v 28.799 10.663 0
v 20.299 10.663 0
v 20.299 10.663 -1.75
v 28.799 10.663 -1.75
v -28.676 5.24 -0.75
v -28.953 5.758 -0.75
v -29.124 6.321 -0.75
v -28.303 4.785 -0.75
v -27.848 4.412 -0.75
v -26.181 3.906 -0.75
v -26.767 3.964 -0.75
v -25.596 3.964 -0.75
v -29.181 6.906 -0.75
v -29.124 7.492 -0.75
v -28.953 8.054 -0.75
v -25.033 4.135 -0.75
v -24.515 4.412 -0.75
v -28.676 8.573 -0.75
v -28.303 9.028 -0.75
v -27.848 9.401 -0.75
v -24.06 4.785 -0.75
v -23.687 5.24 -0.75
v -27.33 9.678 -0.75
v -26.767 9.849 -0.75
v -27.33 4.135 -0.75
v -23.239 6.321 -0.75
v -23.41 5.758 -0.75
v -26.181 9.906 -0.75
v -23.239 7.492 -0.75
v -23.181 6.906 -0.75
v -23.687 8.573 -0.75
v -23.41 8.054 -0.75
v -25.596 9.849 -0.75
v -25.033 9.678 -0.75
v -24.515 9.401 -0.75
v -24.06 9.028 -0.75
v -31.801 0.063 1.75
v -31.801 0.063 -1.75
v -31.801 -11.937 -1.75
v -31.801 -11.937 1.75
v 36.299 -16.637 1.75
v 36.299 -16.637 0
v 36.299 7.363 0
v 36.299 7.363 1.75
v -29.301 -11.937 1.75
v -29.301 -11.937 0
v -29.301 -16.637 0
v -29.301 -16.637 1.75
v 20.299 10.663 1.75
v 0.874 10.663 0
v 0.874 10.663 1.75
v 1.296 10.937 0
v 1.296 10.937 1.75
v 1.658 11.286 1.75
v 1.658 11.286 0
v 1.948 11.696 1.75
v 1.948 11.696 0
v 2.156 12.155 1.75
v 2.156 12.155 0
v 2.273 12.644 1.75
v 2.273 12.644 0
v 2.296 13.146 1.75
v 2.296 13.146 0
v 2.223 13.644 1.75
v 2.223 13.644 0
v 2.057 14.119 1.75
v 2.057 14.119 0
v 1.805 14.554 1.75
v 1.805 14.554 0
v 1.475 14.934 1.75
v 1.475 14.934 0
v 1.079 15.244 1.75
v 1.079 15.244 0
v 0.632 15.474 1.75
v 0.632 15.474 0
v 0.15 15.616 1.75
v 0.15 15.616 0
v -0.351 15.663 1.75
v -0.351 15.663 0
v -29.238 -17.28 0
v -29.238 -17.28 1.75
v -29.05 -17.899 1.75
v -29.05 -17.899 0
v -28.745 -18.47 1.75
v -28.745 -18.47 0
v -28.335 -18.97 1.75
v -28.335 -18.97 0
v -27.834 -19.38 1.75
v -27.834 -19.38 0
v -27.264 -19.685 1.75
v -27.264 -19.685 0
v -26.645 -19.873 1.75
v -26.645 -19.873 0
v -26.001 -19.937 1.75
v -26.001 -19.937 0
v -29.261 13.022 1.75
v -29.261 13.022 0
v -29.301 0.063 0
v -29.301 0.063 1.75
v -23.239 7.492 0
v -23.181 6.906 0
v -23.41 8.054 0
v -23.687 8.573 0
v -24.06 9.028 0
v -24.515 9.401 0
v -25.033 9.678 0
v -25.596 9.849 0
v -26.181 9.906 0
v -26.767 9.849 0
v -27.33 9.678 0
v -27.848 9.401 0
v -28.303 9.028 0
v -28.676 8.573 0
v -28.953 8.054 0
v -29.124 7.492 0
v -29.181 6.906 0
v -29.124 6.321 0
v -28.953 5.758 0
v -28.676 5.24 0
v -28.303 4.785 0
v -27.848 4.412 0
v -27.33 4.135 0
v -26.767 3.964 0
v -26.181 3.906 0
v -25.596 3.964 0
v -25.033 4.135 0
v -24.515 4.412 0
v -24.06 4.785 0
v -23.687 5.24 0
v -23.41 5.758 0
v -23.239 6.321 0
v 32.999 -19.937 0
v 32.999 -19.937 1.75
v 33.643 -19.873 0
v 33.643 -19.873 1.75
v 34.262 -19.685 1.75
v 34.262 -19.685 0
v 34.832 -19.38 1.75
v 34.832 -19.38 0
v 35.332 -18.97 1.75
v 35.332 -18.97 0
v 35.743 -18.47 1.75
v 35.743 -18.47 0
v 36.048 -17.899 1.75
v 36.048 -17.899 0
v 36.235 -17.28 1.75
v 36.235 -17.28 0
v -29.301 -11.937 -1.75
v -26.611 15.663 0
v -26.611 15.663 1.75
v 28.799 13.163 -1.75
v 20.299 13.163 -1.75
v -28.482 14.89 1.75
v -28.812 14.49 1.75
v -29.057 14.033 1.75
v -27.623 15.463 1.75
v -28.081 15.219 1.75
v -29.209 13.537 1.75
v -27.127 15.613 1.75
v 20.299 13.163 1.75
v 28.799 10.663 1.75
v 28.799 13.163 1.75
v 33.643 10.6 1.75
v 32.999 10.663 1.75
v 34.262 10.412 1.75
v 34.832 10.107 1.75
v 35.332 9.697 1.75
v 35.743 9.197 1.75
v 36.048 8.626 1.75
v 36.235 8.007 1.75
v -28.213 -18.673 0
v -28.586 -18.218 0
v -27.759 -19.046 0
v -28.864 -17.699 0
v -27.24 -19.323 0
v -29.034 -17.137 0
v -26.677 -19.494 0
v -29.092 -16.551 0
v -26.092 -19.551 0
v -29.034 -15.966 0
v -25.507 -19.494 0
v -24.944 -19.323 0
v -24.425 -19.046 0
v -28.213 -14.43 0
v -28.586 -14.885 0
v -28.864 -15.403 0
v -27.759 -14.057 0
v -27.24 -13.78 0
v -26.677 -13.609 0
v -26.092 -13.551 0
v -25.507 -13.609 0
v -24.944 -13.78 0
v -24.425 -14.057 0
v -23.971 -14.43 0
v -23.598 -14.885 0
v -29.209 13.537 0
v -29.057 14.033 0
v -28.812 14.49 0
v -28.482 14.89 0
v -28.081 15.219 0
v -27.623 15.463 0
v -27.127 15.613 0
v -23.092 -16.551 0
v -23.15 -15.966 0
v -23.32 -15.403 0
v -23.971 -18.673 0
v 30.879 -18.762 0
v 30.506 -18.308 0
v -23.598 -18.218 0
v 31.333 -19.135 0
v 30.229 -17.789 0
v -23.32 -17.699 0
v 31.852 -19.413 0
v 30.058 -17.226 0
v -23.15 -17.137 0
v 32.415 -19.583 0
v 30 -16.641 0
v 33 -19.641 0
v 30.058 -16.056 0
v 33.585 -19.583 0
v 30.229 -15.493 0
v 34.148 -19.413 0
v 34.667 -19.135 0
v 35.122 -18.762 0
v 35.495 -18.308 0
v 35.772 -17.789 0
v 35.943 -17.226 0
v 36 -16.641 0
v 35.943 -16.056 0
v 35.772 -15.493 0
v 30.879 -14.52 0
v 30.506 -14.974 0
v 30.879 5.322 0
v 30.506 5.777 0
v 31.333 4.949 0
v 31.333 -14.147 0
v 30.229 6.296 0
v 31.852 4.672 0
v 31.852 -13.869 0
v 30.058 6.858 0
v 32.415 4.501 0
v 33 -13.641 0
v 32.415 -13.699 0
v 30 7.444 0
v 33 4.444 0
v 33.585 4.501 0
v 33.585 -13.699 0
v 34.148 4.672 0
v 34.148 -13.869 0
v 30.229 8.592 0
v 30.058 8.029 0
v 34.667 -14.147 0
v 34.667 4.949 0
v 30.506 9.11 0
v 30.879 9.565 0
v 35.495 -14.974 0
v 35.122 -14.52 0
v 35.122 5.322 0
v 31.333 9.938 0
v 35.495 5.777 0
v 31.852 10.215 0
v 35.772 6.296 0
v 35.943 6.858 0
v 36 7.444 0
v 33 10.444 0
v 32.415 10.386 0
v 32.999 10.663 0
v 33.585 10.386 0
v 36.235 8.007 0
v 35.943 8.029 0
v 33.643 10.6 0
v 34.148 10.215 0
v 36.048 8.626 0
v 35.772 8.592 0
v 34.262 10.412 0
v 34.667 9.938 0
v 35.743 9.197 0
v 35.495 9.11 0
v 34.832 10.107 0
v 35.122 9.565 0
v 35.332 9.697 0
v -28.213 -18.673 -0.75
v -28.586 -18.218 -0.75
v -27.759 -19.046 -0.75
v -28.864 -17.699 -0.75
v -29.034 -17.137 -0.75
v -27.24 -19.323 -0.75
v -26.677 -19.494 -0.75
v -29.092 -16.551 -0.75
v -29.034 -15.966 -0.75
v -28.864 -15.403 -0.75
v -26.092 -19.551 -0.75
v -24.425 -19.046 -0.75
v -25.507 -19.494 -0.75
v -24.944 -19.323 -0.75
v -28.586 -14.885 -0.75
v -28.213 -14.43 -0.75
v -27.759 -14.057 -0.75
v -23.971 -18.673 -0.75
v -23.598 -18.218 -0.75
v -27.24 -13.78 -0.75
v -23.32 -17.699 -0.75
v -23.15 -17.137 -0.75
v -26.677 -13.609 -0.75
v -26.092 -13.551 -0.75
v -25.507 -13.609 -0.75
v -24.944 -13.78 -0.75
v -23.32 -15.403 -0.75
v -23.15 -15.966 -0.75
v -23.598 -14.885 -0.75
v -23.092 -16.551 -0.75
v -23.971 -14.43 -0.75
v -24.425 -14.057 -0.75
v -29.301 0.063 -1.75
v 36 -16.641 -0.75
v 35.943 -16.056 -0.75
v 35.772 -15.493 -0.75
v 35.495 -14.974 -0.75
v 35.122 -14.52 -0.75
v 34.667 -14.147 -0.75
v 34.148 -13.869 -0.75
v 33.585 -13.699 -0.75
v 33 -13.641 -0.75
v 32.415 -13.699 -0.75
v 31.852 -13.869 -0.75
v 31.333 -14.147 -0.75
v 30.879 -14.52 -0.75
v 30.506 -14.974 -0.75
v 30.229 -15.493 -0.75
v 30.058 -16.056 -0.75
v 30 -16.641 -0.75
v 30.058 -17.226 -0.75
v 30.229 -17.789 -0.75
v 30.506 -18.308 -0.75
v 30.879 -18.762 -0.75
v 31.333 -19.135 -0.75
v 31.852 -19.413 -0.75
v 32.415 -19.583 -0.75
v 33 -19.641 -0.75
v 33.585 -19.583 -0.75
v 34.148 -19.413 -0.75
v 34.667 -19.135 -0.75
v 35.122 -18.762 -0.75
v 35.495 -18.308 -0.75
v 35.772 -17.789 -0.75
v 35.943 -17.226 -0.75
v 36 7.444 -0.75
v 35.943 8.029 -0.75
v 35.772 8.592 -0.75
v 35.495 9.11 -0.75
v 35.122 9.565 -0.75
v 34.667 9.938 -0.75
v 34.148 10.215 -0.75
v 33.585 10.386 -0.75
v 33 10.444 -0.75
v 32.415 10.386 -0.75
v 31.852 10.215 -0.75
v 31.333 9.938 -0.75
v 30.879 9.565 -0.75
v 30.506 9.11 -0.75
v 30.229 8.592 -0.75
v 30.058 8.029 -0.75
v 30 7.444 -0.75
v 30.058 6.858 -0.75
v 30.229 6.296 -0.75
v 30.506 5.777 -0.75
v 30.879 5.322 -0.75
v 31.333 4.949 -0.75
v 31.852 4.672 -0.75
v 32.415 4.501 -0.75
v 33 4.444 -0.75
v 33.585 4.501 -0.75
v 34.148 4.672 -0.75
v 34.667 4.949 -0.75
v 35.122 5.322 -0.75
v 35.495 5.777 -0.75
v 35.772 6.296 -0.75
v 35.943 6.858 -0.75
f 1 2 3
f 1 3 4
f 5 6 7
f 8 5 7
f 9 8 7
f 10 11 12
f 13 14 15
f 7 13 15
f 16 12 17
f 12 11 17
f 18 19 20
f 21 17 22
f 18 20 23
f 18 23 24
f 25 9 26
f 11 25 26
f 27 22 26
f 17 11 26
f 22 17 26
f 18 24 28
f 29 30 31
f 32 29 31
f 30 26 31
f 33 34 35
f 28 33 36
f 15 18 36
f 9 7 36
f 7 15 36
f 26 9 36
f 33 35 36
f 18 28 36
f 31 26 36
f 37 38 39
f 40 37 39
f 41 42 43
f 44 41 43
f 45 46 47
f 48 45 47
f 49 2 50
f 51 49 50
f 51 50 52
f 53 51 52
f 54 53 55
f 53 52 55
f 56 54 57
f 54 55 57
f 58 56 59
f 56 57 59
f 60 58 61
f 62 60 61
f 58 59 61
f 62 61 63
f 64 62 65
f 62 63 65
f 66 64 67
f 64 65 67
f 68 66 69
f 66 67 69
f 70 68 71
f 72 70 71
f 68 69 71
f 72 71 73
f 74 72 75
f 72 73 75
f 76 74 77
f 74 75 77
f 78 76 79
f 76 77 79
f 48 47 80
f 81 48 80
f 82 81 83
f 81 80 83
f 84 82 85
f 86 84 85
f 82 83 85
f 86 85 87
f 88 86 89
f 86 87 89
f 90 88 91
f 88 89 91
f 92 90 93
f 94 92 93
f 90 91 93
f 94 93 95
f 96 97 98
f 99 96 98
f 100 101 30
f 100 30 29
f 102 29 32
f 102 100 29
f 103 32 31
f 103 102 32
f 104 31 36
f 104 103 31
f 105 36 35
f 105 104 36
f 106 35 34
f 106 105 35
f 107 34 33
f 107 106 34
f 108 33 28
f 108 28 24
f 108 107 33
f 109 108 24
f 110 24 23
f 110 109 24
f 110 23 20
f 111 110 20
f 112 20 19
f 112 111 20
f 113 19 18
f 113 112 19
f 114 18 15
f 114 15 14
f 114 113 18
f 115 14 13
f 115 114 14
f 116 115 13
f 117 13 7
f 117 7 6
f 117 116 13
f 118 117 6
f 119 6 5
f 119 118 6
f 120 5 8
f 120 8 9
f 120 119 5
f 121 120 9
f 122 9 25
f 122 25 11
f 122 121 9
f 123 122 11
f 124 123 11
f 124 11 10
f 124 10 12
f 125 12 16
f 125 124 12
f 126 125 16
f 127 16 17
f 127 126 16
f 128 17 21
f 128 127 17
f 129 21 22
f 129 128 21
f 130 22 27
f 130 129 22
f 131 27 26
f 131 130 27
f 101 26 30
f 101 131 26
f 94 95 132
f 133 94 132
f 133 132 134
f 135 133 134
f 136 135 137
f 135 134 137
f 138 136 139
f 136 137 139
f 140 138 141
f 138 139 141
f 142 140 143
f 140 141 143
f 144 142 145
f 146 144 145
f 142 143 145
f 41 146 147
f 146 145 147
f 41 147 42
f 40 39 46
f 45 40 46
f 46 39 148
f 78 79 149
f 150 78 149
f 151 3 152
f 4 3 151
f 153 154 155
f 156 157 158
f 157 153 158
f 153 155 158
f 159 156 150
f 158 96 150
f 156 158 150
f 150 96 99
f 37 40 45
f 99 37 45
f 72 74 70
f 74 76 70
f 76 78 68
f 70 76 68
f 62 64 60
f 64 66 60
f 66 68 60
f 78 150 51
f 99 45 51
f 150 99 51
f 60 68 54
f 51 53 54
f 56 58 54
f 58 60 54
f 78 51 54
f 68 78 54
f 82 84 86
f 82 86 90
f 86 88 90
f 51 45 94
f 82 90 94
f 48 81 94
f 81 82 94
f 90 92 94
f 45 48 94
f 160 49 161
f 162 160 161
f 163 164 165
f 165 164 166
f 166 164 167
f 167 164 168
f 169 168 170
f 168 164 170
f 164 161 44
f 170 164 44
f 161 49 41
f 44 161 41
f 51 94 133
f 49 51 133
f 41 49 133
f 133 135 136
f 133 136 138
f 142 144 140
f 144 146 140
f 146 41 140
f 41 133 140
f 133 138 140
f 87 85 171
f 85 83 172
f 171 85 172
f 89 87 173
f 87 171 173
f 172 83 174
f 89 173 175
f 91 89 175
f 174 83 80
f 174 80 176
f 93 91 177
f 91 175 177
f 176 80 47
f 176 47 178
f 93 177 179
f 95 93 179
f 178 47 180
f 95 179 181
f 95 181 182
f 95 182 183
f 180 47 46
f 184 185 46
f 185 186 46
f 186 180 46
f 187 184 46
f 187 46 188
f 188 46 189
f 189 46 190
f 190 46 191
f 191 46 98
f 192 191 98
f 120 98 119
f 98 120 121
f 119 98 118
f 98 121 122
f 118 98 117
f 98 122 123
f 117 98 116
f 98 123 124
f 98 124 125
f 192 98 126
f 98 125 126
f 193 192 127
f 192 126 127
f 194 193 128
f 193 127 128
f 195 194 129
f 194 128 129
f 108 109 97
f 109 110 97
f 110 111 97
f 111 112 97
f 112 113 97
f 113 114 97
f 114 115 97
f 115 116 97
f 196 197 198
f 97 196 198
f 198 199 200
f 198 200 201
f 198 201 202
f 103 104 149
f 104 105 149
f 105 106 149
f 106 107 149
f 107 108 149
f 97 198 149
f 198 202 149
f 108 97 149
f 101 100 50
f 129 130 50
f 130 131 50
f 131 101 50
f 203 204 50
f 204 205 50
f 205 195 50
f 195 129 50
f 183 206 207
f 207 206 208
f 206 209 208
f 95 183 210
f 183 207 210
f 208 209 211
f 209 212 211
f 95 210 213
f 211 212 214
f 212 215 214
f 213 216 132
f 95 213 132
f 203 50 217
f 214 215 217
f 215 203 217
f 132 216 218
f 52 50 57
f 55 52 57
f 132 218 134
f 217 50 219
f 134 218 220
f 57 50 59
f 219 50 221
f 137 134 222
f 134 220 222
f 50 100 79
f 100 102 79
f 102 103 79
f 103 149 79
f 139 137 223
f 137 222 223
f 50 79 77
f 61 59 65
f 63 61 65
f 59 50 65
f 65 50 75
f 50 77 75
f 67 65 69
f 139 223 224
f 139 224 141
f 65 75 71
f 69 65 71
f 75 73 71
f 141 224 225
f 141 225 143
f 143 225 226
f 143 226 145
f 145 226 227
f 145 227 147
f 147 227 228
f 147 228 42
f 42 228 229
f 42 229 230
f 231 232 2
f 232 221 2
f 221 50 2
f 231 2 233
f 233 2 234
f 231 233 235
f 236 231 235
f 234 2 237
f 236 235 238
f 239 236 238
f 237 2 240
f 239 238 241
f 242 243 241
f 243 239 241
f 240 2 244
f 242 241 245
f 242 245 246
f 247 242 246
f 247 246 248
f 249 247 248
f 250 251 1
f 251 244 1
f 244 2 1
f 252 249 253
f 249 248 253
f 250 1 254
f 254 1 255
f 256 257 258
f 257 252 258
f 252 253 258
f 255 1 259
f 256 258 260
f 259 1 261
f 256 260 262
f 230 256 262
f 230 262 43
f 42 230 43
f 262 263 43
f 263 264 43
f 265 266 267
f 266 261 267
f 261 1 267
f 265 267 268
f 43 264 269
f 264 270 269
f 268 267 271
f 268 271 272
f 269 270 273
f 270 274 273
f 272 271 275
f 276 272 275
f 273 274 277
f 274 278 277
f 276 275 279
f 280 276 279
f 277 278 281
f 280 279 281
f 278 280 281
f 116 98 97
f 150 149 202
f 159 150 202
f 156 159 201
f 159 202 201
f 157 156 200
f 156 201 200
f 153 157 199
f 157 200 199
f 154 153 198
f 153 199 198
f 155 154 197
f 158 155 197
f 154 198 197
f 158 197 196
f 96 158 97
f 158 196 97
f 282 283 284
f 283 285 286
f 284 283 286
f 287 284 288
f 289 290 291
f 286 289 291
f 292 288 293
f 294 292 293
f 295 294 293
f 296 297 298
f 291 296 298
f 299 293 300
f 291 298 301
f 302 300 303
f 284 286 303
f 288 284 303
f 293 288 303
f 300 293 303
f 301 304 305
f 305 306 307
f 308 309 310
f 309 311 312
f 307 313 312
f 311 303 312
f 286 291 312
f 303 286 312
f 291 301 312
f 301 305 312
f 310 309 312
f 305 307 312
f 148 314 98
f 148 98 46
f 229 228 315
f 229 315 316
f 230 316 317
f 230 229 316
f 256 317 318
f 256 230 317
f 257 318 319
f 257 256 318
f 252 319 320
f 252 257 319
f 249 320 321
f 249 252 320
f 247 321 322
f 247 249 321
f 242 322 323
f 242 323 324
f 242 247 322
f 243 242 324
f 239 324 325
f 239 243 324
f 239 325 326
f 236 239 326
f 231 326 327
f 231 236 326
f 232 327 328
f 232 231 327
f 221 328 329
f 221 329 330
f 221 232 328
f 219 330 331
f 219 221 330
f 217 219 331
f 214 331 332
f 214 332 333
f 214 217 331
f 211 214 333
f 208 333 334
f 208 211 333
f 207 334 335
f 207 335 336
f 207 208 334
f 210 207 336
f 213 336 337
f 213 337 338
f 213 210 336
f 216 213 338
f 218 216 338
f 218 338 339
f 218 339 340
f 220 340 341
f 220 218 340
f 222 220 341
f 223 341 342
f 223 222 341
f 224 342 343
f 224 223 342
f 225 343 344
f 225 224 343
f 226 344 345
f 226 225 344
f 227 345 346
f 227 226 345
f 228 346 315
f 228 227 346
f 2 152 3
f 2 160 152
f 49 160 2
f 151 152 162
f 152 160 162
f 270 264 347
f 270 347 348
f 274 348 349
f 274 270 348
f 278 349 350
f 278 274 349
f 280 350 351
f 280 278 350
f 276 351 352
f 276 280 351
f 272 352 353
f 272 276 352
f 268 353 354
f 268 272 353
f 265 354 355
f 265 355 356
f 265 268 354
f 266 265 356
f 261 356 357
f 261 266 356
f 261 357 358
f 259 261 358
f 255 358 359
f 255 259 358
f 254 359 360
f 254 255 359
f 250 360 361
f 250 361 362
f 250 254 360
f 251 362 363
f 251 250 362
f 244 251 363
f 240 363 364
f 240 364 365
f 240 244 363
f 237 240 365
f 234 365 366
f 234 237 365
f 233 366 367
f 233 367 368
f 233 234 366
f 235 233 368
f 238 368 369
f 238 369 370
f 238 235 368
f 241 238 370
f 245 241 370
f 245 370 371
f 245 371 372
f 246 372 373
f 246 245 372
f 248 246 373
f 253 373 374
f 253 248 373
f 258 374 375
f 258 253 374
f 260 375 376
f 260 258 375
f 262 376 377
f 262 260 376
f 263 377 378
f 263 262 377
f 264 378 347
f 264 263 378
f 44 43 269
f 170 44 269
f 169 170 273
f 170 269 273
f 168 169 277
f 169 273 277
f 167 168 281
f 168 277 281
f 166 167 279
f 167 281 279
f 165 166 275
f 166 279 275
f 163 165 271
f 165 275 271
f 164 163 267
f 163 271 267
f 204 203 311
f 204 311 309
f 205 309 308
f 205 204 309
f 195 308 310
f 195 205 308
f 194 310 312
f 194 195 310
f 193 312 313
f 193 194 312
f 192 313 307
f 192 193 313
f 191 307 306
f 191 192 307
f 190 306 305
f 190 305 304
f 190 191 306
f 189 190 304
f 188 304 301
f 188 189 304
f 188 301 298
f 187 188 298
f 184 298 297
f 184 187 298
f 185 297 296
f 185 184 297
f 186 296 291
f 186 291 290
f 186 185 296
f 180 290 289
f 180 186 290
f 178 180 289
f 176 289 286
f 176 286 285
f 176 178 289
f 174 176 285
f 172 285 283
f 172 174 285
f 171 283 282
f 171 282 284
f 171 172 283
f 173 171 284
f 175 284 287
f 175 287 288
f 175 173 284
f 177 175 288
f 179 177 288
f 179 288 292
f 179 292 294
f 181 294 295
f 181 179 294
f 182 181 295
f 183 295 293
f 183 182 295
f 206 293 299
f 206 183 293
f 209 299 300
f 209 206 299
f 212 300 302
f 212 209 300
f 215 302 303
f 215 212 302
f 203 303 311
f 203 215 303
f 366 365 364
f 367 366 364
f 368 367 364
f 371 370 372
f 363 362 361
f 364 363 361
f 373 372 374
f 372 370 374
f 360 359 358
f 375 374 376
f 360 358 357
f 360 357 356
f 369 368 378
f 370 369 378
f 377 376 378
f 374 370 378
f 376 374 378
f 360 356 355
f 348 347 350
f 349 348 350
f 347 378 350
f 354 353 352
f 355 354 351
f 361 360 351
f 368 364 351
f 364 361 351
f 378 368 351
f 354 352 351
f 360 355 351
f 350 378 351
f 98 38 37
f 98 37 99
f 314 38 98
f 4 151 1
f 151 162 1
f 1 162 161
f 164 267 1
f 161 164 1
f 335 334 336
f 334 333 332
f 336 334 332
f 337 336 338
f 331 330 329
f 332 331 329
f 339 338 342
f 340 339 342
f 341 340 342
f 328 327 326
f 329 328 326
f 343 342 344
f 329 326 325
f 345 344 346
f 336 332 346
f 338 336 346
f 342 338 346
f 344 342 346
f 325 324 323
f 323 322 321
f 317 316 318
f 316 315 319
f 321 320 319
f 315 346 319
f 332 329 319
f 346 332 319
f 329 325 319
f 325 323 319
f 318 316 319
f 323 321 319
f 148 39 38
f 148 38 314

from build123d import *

# Parameters (mm, degrees)
F1_DEPTH = 1.75
F2_W     = 8.5
F2_H     = 2.5
F2_W_2   = 2.5
F2_H_2   = 12
F3_DEPTH = 1.75
F4_R     = 3
F5_DEPTH = 0.75


with BuildPart() as f1:
    # F0 (on Top) → F1 (new body)
    with BuildSketch(Plane.XY):
        with BuildLine():
            Line((-29.301108, -0.113589), (-29.301108, -16.636517))
            ThreePointArc((-29.301108, -16.636517), (-28.33456, -18.96997), (-26.001107, -19.936517))
            Line((-26.001107, -19.936517), (32.998893, -19.936517))
            ThreePointArc((32.998893, -19.936517), (35.332345, -18.96997), (36.298893, -16.636517))
            Line((36.298893, -16.636517), (36.298893, 7.363483))
            ThreePointArc((36.298893, 7.363483), (35.332345, 9.696936), (32.998893, 10.663484))
            Line((32.998893, 10.663484), (0.87364, 10.663484))
            ThreePointArc((0.87364, 10.663484), (2.222801, 13.64396), (-0.351107, 15.663484))
            Line((-0.351107, 15.663484), (-26.610989, 15.663484))
            ThreePointArc((-26.610989, 15.663484), (-28.481957, 14.890177), (-29.260977, 13.021579))
            Line((-29.260977, 13.021579), (-29.301108, -0.113589))
        make_face()
    extrude(amount=F1_DEPTH)

    # F2 (on face) → F3 (join, symmetric)
    with BuildSketch(Plane(origin=(0, 0, 0), x_dir=(1, 0, 0), z_dir=(0, 0, -1))):
        with Locations((24.548893, -11.913484)):
            Rectangle(F2_W, F2_H)
        with Locations((-30.550567, 5.936517)):
            Rectangle(F2_W_2, F2_H_2)
    extrude(amount=F3_DEPTH, both=True)

    # F4 (on face) → F5 (join)
    with BuildSketch(Plane.XY):
        with Locations((33.000201, -16.640954)):
            Circle(F4_R)
        with Locations((33.000201, 7.443574)):
            Circle(F4_R)
        with Locations((-26.091952, -16.551422)):
            Circle(F4_R)
        with Locations((-26.181484, 6.906373)):
            Circle(F4_R)
    extrude(amount=-F5_DEPTH)


solid = f1.part
